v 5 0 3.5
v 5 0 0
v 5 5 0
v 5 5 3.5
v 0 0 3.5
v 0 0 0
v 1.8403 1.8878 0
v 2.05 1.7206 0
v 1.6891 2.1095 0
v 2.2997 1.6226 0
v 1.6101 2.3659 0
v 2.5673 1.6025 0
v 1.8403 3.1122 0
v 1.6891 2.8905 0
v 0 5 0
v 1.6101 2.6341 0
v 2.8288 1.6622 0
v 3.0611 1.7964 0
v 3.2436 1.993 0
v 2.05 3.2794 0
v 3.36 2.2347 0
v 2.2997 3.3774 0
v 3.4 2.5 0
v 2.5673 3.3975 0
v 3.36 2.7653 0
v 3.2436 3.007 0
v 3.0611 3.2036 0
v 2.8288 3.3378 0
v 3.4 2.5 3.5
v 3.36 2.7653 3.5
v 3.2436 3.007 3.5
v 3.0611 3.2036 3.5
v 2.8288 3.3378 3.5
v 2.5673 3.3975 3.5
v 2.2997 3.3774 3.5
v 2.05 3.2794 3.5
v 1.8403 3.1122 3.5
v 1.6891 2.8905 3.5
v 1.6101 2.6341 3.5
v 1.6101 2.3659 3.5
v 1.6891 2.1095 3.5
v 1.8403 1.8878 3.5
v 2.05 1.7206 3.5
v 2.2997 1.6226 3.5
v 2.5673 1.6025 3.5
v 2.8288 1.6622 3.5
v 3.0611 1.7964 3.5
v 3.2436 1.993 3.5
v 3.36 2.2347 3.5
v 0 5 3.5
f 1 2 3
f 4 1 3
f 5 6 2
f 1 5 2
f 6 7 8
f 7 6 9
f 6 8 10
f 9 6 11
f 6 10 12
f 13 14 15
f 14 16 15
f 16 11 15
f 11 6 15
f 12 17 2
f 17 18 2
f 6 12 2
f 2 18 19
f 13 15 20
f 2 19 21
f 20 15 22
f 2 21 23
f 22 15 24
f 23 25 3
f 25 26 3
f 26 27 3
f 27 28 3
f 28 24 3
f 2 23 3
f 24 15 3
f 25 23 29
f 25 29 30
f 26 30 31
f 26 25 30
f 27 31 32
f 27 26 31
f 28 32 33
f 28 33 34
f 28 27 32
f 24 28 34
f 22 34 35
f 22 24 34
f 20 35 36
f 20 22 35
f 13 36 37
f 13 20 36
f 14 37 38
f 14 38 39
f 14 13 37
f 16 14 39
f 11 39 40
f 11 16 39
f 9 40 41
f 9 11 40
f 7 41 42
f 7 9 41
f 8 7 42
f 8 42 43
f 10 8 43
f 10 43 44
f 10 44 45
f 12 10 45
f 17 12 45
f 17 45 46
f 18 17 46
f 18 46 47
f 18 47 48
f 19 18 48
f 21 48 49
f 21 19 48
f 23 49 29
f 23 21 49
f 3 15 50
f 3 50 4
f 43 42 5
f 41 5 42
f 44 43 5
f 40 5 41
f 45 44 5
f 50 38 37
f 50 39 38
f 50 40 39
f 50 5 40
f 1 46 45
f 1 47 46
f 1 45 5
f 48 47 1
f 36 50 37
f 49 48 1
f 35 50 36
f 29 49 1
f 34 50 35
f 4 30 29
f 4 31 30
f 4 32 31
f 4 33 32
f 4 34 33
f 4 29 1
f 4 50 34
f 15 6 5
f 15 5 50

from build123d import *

# Parameters (mm, degrees)
CYLINDER012_R     = 0.9
CYLINDER012_DEPTH = 3.5
BOX039_W          = 5
BOX039_H          = 5
BOX039_DEPTH      = 3.5


with BuildPart() as anchorscrew:
    # Cylinder012 → Cylinder012 (new body)
    with BuildSketch(Plane(origin=(2.5, 2.5, 0), x_dir=(1, 0, 0), z_dir=(0, 0, 1))):
        Circle(CYLINDER012_R)
    extrude(amount=CYLINDER012_DEPTH)


with BuildPart() as anchor:
    # Box039 → Box039 (new body)
    with BuildSketch(Plane.XY):
        with Locations((2.5, 2.5)):
            Rectangle(BOX039_W, BOX039_H)
    extrude(amount=BOX039_DEPTH)

    # Cut010: cut AnchorScrew
    add(anchorscrew.part, mode=Mode.SUBTRACT)


solid = anchor.part
